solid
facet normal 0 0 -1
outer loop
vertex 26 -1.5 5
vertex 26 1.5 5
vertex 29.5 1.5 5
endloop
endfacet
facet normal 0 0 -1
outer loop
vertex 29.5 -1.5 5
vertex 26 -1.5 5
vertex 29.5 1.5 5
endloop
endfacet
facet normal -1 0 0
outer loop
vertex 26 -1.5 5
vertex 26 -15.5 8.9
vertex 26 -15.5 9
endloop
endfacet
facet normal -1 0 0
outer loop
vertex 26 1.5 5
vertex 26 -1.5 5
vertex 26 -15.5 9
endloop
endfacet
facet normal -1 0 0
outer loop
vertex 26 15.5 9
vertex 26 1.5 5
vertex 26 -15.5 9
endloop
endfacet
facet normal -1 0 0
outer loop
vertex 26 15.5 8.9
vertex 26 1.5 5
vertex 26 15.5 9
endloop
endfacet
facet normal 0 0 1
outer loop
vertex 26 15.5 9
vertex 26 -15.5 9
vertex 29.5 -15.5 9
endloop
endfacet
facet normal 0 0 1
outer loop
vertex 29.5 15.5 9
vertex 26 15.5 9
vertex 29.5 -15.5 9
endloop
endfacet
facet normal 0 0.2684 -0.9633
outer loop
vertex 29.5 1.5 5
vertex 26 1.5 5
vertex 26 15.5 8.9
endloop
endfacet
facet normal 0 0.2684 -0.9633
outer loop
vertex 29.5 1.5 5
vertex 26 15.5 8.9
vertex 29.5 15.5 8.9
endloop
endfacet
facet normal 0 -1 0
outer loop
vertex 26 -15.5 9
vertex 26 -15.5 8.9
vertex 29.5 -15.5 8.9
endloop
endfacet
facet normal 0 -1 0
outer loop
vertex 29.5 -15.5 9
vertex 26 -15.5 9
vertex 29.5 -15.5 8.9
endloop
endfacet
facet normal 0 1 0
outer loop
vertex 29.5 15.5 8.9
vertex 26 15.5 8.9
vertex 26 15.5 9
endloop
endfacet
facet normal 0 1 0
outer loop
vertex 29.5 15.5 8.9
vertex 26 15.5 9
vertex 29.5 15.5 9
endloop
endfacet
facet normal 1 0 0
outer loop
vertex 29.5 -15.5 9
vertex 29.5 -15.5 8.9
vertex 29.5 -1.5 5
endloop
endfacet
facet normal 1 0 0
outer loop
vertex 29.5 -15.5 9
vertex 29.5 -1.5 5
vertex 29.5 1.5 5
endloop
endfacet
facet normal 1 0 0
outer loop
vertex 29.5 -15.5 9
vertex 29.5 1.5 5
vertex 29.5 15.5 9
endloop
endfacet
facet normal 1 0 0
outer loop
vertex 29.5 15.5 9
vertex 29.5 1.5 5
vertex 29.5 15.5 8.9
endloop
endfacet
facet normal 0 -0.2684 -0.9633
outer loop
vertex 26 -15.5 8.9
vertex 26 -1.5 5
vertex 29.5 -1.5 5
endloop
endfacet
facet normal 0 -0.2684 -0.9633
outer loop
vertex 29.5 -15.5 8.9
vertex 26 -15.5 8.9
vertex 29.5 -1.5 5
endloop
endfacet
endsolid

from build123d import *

# Parameters (mm, degrees)
BOX133_W           = 3.5
BOX133_H           = 31
BOX133_DEPTH       = 4
CHAMFER022_1_SIZE2 = 14
CHAMFER022_1_SIZE  = 3.9
CHAMFER022_2_SIZE2 = 14
CHAMFER022_2_SIZE  = 3.9


with BuildPart() as part:
    # Box133 → Box133 (new body)
    with BuildSketch(Plane(origin=(26, -16.5, 6), x_dir=(1, 0, 0), z_dir=(0, 0, 1))):
        with Locations((1.75, 15.5)):
            Rectangle(BOX133_W, BOX133_H)
    extrude(amount=BOX133_DEPTH)

    # Chamfer022 1
    chamfer022_1_edges = [part.edges().sort_by_distance(p)[0] for p in [
        (27.75, 14.5, 6),
    ]]
    chamfer022_1_side = part.faces().sort_by_distance((27.75, 14.5, 8))[0]
    chamfer(chamfer022_1_edges, length=CHAMFER022_1_SIZE, length2=CHAMFER022_1_SIZE2, reference=chamfer022_1_side)

    # Chamfer022 2
    chamfer022_2_edges = [part.edges().sort_by_distance(p)[0] for p in [
        (27.75, -16.5, 6),
    ]]
    chamfer022_2_side = part.faces().sort_by_distance((27.75, -16.5, 8))[0]
    chamfer(chamfer022_2_edges, length=CHAMFER022_2_SIZE, length2=CHAMFER022_2_SIZE2, reference=chamfer022_2_side)


with BuildPart() as part_1:
    # Chamfer022 placement: moved
    add(part.part.moved(Location((0, 1, -1))))


solid = part_1.part
